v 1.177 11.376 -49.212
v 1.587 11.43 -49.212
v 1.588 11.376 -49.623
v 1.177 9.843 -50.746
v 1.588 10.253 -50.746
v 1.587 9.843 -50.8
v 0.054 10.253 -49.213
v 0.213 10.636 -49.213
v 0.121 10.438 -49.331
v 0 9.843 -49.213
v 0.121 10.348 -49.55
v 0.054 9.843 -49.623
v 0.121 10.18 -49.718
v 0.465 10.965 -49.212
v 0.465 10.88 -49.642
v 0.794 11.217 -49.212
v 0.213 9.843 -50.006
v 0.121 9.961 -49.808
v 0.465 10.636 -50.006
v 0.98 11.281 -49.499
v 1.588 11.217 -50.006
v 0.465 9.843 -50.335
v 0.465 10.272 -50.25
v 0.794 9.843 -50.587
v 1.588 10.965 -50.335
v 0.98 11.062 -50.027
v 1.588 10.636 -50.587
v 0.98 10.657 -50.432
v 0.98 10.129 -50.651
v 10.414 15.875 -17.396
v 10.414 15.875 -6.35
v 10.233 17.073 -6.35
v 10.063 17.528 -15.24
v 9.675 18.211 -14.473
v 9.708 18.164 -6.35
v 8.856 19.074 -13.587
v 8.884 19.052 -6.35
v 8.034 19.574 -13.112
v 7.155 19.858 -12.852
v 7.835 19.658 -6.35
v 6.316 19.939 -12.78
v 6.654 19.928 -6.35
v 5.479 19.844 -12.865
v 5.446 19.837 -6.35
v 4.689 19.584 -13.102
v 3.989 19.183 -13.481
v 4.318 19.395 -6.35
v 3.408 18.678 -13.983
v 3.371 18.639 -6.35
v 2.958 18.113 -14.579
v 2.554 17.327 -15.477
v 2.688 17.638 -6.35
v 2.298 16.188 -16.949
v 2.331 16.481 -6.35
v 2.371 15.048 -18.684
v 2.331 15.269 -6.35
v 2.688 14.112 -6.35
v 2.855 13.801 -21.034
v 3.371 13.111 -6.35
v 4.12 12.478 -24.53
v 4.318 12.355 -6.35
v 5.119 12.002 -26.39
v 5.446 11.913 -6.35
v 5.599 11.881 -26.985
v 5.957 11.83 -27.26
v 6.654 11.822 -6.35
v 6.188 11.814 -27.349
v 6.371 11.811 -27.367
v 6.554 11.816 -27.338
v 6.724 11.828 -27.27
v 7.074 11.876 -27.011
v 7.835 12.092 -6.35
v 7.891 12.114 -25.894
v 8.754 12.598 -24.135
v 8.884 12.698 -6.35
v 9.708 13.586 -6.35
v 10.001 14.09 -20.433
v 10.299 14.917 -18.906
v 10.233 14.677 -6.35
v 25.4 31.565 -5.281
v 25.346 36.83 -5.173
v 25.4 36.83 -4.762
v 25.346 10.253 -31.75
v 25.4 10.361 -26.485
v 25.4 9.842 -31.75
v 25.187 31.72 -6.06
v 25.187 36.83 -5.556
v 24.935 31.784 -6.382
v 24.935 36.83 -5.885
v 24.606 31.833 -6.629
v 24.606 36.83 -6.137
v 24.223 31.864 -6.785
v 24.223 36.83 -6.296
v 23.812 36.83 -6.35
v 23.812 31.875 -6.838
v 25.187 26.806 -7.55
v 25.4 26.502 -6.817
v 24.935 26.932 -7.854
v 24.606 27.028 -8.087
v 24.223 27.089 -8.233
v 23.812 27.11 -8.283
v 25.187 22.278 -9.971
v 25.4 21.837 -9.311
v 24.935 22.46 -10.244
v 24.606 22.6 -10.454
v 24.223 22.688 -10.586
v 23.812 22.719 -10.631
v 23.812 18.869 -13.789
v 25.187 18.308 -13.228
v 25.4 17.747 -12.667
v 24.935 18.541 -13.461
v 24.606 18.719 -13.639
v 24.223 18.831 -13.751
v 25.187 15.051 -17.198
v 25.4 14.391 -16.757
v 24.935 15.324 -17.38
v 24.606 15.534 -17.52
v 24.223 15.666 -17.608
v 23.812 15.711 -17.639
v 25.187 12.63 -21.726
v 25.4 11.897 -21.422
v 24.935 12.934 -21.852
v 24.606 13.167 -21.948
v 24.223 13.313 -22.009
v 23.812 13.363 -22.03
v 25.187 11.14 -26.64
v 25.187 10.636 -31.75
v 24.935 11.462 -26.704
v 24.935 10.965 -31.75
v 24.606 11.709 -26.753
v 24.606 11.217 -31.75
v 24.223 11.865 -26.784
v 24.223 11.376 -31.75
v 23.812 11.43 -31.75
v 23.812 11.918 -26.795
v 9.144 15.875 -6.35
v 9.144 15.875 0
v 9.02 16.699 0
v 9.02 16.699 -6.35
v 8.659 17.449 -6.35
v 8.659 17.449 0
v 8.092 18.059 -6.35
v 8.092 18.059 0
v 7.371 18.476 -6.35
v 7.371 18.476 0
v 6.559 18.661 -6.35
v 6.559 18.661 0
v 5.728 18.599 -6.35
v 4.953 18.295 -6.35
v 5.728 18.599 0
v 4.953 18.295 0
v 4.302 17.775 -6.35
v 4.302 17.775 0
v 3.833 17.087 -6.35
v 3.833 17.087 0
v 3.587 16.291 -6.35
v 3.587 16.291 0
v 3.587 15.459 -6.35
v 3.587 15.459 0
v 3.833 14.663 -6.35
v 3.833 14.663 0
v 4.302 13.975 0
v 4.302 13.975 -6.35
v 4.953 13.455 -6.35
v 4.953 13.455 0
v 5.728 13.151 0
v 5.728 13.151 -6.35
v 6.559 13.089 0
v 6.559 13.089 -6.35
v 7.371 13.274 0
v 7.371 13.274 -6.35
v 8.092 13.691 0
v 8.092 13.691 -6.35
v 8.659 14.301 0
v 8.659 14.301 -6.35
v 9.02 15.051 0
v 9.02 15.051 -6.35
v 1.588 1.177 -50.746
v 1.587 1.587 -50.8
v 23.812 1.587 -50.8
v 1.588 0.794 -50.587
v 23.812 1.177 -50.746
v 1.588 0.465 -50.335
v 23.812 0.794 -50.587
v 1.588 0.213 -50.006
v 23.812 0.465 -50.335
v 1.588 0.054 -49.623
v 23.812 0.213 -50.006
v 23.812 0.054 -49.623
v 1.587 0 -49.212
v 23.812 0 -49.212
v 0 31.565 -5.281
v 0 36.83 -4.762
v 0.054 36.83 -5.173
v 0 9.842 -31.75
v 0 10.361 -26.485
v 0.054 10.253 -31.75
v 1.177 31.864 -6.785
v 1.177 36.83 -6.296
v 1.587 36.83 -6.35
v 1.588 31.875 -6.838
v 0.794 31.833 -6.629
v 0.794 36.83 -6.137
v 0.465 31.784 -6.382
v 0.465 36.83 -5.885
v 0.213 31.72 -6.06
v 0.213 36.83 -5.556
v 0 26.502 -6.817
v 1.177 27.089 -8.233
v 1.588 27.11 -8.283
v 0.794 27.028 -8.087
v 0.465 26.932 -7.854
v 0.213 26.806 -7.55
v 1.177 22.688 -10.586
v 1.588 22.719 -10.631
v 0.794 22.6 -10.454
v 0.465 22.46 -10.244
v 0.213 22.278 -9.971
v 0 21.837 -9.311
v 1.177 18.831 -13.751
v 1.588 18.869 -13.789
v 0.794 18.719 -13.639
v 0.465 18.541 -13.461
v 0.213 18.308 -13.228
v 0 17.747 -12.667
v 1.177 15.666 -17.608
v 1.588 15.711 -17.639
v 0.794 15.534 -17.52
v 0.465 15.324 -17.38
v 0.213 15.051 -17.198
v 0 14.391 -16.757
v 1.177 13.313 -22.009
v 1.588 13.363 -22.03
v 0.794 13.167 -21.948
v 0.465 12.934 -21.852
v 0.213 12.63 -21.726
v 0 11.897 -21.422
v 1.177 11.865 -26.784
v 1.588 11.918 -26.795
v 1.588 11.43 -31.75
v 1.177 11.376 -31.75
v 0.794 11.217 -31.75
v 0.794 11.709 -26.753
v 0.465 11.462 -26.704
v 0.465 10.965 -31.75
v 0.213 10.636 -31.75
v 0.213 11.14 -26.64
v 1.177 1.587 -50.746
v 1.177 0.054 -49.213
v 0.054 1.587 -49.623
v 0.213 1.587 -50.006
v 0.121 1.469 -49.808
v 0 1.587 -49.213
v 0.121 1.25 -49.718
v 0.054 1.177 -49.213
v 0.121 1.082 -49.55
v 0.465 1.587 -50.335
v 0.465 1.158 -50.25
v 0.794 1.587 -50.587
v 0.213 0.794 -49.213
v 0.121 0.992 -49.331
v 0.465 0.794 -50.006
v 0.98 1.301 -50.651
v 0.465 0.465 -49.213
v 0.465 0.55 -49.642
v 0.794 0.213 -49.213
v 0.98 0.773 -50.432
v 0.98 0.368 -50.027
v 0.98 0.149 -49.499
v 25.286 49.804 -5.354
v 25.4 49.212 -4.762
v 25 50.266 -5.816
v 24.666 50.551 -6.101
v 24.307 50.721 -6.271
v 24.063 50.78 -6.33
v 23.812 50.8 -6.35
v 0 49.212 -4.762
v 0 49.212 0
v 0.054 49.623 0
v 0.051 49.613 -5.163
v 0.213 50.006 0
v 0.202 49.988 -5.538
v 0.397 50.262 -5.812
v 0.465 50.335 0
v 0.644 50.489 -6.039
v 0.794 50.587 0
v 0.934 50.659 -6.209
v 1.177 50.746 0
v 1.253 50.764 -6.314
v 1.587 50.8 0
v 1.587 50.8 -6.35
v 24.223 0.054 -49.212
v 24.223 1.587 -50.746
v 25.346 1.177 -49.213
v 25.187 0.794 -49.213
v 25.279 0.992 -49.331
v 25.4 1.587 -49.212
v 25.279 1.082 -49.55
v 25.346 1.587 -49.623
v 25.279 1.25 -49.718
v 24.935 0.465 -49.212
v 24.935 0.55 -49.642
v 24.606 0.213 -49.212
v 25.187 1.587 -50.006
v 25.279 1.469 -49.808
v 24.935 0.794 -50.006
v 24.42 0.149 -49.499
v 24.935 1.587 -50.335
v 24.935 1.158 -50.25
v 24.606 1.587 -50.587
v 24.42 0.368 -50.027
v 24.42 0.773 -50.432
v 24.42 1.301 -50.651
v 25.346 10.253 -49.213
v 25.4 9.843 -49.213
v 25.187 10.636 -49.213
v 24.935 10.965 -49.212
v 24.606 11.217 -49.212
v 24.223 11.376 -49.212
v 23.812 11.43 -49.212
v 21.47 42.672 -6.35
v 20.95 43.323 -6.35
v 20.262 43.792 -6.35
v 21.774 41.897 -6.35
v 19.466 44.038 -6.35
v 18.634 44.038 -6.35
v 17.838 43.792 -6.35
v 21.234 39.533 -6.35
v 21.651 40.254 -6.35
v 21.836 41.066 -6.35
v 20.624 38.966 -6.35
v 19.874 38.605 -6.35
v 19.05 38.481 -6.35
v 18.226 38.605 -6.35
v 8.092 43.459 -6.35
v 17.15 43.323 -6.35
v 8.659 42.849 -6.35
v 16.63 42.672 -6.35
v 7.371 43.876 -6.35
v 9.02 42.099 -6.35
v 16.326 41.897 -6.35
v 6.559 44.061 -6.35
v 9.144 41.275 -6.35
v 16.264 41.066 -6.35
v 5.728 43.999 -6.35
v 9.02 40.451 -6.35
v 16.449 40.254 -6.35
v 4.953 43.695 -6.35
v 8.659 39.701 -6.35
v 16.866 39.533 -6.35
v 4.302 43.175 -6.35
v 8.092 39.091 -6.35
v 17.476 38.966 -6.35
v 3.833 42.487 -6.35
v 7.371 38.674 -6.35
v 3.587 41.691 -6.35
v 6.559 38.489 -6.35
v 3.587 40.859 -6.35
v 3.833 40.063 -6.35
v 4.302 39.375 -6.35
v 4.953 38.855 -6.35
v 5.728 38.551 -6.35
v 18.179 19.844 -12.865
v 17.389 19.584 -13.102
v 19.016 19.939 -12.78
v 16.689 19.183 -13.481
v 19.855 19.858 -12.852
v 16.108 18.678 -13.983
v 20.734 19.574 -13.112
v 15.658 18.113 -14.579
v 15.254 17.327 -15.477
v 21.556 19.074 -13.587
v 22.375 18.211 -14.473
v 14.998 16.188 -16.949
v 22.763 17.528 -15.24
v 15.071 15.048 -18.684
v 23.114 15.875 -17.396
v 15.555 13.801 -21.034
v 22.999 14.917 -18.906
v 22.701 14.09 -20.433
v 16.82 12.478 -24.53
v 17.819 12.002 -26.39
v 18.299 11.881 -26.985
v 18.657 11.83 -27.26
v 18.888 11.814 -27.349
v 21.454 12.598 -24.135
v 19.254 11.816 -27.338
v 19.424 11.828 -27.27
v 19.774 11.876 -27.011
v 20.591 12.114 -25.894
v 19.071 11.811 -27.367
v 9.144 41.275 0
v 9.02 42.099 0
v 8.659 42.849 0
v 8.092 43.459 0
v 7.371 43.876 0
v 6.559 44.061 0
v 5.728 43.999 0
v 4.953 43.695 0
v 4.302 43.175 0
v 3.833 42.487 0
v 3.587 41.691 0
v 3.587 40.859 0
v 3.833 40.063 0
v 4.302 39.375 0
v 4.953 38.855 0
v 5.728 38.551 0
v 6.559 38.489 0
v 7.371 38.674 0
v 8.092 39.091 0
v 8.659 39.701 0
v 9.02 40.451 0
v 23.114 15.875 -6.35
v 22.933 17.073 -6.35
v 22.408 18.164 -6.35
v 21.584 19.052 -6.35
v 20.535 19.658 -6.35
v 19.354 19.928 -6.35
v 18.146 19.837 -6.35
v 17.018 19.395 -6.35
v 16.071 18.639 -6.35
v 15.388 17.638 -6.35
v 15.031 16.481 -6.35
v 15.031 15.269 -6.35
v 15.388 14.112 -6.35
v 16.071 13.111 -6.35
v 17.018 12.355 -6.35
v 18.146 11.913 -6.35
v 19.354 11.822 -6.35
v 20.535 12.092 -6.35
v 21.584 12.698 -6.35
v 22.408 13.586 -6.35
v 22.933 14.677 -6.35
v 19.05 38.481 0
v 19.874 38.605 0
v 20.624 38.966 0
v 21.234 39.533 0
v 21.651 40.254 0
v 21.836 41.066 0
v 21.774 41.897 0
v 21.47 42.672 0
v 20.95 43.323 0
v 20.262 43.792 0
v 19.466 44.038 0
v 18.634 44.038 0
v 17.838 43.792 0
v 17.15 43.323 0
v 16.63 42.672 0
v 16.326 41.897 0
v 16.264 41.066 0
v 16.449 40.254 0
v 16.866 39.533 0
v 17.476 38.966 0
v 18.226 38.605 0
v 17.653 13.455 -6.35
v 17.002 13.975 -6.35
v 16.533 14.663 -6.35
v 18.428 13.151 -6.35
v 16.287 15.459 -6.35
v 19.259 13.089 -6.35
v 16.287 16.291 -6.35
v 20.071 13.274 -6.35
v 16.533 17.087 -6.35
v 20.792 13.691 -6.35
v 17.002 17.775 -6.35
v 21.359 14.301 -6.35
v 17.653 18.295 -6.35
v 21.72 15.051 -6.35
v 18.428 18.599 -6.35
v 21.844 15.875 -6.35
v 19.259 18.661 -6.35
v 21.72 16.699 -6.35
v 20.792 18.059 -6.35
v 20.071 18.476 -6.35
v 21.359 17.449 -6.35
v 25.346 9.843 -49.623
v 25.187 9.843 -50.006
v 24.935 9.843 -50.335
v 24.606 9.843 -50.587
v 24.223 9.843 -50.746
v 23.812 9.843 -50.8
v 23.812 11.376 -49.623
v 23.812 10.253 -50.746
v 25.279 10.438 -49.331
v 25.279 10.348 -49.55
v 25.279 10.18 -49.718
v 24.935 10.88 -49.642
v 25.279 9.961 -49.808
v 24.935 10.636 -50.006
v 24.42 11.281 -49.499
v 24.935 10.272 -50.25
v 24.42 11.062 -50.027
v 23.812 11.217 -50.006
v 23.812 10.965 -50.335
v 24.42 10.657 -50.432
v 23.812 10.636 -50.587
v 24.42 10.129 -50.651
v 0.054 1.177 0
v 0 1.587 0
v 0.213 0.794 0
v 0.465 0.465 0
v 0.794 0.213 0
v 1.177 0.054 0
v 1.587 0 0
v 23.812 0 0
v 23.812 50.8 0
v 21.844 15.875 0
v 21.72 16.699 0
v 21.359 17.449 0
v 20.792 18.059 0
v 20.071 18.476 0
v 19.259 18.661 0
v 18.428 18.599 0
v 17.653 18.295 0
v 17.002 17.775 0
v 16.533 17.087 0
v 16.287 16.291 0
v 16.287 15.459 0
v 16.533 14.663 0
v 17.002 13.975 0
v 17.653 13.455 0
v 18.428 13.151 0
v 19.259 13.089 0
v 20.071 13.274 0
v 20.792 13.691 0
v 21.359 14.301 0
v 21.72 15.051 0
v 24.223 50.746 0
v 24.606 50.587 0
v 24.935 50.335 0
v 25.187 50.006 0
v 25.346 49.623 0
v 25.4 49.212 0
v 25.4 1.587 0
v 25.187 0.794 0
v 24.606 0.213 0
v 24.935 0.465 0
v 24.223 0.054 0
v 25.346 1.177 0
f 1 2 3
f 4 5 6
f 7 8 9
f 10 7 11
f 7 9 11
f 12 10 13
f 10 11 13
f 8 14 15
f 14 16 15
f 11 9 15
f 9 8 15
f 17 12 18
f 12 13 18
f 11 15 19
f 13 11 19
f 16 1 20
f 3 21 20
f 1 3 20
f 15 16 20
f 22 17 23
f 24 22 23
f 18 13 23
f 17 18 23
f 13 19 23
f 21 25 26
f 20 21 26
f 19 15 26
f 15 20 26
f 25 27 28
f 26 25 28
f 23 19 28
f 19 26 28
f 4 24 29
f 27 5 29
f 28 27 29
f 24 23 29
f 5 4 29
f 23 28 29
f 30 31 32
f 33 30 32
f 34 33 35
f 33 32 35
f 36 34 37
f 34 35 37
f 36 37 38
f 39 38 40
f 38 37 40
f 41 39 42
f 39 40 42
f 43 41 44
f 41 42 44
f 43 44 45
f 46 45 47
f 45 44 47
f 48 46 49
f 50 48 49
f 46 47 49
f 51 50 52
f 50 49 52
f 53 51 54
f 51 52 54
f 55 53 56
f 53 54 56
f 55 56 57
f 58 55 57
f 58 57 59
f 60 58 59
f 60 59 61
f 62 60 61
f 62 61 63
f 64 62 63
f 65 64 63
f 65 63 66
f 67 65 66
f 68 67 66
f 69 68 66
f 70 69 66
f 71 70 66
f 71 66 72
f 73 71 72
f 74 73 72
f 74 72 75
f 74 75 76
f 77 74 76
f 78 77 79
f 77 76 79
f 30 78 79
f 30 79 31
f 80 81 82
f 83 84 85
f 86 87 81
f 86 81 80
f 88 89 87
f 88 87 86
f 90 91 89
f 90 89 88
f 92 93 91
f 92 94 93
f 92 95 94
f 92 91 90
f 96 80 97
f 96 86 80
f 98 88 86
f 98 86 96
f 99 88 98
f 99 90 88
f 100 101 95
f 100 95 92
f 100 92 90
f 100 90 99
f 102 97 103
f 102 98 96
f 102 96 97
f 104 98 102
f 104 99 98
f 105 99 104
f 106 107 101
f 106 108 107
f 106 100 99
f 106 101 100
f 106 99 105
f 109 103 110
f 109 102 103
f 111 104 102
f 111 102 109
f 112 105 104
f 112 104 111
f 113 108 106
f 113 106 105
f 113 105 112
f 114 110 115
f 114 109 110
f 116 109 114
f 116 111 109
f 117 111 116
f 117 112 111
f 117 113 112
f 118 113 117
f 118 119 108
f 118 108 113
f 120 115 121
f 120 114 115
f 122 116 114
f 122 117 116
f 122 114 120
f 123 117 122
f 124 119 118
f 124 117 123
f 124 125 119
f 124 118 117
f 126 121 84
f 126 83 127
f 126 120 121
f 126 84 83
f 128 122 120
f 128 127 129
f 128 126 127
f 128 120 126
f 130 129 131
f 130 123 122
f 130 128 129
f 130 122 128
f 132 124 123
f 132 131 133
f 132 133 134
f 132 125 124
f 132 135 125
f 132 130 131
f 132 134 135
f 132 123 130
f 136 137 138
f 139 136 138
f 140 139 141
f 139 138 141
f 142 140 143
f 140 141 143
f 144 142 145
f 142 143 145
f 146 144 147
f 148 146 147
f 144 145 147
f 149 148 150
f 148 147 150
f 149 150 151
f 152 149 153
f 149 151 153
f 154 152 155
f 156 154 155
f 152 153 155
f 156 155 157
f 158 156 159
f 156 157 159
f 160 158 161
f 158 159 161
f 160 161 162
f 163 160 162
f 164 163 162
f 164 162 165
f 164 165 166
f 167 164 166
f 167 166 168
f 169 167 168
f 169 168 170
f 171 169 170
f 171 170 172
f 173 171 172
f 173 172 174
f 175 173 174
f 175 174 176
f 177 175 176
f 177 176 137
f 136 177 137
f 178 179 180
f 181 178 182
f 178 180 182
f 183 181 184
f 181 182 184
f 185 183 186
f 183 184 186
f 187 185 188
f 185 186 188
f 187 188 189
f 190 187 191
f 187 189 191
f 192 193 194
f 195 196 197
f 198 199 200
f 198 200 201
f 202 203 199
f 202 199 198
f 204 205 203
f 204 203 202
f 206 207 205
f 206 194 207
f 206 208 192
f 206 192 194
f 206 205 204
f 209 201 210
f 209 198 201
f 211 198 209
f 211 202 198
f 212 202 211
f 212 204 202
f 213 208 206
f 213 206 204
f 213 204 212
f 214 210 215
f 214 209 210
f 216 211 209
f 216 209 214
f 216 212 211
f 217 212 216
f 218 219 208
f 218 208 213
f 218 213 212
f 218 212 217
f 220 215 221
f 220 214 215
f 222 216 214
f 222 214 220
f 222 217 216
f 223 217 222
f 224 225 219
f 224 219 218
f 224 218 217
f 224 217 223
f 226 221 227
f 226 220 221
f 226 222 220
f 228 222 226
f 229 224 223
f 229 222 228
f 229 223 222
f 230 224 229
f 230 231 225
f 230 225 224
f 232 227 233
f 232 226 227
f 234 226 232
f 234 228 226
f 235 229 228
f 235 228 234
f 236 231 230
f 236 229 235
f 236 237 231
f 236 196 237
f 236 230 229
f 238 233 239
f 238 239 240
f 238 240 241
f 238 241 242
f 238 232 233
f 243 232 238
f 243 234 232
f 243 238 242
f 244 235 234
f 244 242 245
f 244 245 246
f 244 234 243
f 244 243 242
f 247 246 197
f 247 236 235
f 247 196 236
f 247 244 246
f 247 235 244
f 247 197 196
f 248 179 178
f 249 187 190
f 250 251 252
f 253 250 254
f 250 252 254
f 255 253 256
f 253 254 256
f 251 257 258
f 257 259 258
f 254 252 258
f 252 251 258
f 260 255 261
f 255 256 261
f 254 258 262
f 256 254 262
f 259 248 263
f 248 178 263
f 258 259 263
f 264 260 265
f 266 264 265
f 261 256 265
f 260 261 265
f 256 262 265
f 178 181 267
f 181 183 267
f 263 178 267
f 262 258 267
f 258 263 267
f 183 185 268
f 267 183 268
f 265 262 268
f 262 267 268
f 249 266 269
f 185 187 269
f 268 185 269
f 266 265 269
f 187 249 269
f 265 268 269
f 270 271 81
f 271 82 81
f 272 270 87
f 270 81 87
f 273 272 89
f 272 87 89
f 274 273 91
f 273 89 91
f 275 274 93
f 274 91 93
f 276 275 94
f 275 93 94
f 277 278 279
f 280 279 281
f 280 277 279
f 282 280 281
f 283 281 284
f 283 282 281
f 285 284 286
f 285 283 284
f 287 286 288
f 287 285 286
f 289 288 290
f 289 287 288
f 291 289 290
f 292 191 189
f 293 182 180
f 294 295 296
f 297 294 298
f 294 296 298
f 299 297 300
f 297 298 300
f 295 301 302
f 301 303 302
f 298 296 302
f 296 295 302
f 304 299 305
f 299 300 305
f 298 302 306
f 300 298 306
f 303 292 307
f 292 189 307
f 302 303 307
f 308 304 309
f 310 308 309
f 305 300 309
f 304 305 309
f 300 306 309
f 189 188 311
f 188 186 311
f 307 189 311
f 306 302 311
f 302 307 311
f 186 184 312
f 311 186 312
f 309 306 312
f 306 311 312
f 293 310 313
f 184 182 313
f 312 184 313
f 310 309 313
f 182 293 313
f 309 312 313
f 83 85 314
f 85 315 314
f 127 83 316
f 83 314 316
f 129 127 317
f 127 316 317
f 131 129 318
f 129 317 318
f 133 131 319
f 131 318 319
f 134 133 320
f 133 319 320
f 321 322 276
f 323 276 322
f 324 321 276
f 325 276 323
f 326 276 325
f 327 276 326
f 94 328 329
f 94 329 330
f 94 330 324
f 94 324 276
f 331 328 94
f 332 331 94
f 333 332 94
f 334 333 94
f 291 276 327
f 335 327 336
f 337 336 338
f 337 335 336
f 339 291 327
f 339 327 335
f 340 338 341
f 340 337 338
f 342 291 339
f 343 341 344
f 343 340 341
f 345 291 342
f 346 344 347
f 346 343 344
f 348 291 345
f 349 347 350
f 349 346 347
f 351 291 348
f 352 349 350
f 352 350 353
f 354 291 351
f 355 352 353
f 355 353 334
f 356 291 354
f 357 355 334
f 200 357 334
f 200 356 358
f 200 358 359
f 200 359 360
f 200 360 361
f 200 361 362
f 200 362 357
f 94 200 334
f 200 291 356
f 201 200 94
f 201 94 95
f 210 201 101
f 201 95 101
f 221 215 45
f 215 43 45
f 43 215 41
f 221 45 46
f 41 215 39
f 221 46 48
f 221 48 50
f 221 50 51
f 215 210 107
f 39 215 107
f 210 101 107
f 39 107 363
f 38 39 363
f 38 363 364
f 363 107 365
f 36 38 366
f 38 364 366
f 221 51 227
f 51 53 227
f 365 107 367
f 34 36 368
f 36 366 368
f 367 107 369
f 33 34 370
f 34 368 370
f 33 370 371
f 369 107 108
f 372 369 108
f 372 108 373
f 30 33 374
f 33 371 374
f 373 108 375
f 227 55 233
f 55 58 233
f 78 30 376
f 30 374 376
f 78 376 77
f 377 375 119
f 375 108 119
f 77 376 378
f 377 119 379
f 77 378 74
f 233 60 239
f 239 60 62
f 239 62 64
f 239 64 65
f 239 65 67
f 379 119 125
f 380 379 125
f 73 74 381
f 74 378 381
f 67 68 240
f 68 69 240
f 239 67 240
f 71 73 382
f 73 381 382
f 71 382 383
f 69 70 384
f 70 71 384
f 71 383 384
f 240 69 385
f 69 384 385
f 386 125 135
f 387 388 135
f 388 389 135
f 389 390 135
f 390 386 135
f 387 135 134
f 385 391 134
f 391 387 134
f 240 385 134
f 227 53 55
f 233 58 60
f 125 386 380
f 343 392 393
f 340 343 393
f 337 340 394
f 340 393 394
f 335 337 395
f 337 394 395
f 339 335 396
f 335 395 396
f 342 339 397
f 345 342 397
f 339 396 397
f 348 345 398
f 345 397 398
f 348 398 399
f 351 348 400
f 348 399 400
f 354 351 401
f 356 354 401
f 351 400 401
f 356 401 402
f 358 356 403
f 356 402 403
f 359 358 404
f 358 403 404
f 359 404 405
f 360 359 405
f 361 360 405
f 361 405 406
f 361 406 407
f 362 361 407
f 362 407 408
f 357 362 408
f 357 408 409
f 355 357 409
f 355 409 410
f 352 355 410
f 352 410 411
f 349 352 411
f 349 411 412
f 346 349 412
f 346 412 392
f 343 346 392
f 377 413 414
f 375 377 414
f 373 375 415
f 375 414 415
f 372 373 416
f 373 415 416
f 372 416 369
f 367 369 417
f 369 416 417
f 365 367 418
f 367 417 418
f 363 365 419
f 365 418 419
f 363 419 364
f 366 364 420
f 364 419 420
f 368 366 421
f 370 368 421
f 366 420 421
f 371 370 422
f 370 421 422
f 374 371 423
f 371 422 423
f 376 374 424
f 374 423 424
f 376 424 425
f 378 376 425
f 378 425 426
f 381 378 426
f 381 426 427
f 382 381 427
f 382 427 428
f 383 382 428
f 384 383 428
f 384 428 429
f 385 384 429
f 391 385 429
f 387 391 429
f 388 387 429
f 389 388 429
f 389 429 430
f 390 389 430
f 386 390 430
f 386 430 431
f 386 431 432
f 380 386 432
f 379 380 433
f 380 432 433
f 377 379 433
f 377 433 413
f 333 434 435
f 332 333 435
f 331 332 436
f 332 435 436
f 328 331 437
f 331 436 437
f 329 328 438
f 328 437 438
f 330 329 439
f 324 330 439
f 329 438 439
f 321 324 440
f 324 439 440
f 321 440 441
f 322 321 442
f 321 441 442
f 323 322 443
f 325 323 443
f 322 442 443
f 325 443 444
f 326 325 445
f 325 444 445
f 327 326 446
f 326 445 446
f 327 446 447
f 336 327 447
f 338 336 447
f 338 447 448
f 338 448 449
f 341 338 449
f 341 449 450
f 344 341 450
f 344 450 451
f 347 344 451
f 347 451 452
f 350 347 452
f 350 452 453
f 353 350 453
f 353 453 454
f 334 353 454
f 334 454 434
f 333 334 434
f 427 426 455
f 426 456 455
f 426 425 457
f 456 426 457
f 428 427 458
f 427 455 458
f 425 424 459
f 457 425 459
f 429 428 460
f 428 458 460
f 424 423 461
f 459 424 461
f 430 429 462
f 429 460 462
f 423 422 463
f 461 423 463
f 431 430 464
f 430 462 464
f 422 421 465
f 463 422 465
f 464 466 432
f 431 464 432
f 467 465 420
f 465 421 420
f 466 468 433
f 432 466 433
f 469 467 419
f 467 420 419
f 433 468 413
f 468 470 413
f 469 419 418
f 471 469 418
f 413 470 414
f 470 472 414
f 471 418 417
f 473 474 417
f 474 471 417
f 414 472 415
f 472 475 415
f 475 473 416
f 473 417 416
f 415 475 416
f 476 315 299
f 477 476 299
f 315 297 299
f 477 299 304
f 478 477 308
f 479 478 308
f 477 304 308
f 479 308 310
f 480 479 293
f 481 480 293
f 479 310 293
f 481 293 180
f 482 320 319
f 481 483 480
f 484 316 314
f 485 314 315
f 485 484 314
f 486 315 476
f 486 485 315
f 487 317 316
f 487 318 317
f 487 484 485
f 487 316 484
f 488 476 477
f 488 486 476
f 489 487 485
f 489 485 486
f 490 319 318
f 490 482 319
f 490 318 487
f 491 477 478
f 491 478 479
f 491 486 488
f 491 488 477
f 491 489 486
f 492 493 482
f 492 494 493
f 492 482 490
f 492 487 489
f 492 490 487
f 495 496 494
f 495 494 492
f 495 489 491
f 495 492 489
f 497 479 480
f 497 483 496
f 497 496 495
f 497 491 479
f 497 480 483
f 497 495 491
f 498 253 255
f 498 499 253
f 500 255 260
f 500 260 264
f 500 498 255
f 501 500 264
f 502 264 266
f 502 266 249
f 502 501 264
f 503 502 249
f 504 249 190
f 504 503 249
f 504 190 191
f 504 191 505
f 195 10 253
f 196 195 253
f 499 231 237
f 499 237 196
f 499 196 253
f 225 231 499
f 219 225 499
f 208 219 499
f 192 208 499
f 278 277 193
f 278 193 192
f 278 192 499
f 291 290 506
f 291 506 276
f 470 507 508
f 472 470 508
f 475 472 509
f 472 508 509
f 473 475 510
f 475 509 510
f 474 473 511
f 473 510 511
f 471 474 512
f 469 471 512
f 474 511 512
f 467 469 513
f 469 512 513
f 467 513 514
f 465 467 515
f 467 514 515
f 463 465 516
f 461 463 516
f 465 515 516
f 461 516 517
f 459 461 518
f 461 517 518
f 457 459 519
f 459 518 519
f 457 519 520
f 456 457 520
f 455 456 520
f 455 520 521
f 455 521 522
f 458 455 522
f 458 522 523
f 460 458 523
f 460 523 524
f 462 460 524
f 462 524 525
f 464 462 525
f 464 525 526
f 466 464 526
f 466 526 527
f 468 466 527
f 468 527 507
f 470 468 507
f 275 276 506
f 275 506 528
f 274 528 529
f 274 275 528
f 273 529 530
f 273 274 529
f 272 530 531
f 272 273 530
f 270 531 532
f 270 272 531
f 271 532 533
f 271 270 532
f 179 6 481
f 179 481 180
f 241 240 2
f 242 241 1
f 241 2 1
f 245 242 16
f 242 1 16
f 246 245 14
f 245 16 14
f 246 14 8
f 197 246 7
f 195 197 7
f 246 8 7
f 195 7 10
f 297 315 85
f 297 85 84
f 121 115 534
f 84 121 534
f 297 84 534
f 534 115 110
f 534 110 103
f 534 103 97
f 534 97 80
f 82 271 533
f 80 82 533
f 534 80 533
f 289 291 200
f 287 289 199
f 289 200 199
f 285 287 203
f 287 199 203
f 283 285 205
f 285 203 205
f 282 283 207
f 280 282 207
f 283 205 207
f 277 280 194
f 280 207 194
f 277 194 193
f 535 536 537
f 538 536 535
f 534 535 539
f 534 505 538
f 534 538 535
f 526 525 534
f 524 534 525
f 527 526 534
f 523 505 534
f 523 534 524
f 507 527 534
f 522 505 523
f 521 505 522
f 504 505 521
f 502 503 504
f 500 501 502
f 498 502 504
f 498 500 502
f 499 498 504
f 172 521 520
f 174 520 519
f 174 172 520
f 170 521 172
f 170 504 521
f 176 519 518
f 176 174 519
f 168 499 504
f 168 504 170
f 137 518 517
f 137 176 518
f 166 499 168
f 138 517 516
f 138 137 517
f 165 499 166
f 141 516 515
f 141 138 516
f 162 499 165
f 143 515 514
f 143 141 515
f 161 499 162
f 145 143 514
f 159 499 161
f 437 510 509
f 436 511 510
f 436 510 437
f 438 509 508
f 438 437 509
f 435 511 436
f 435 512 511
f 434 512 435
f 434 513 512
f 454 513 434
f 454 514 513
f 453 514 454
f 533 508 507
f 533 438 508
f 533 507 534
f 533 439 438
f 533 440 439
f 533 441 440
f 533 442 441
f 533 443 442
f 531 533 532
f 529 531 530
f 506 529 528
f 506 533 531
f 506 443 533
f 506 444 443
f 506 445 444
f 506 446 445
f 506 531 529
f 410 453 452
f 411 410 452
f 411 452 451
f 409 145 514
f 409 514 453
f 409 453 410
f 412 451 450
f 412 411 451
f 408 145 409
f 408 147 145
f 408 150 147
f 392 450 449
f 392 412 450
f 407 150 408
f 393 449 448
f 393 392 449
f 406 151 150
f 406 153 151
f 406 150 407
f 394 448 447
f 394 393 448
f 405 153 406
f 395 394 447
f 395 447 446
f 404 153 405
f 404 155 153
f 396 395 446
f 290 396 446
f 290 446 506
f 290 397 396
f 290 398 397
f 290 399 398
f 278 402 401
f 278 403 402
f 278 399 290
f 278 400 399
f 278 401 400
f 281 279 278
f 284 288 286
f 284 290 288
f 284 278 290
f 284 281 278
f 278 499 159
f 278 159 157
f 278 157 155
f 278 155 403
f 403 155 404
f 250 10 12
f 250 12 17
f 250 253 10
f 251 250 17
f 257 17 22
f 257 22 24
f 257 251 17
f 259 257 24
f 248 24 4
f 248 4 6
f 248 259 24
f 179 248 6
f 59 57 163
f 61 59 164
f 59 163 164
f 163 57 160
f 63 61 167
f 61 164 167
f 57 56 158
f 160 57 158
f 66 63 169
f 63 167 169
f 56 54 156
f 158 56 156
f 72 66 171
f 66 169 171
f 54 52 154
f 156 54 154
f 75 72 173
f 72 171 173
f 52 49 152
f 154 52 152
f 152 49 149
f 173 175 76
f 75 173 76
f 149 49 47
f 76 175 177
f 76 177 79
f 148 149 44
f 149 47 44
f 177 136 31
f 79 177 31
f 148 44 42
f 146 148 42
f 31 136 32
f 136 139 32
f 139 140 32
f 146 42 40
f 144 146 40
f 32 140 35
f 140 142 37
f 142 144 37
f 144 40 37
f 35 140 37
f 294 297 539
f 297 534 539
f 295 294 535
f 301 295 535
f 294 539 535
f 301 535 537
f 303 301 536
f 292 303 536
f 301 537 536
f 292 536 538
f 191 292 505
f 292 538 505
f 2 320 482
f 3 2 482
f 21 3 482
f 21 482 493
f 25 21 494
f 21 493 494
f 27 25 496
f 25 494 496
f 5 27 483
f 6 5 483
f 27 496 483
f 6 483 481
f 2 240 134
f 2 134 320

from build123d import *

# Parameters (mm, degrees)
BOSS_EXTRUDE1_DEPTH = 25.4
FILLET1_R           = 25.4
SKETCH2_R           = 2.794
CUT_EXTRUDE1_DEPTH  = 77.2
CUT_EXTRUDE2_START  = -6.35
SKETCH3_R           = 4.064
CUT_EXTRUDE2_DEPTH  = 70.850000033
FILLET2_R           = 1.5875


with BuildPart() as part:
    # Sketch1 → Boss-Extrude1 (new body)
    with BuildSketch(Plane(origin=(0, 0, 0), x_dir=(0, 0, -1), z_dir=(1, 0, 0))):
        Polygon((0, 0), (0, 50.8), (6.35, 50.8), (6.35, 11.43), (50.8, 11.43), (50.8, 0), align=None)
    extrude(amount=BOSS_EXTRUDE1_DEPTH)

    # Fillet1
    fillet1_edges = [part.edges().sort_by_distance(p)[0] for p in [
        (12.7, 11.43, -6.35),
    ]]
    fillet(fillet1_edges, radius=FILLET1_R)

    # Sketch2 → Cut-Extrude1 (cut, through all)
    with BuildSketch(Plane.XY):
        with Locations((6.35, 41.275)):
            Circle(SKETCH2_R)
        with Locations((6.35, 15.875)):
            Circle(SKETCH2_R)
        with Locations(Location((19.05, 41.275, 0), (0, 0, 270))):
            Circle(SKETCH2_R)
        with Locations((19.05, 15.875)):
            Circle(SKETCH2_R)
    extrude(amount=-CUT_EXTRUDE1_DEPTH, mode=Mode.SUBTRACT)

    # Sketch3 → Cut-Extrude2 (cut, through all)
    with BuildSketch(Plane.XY.offset(CUT_EXTRUDE2_START)):
        with Locations((6.35, 15.875)):
            Circle(SKETCH3_R)
        with Locations((19.05, 15.875)):
            Circle(SKETCH3_R)
    extrude(amount=-CUT_EXTRUDE2_DEPTH, mode=Mode.SUBTRACT)

    # Fillet2
    fillet2_edges = [part.edges().sort_by_distance(p)[0] for p in [
        (12.7, 11.43, -50.8),
        (12.7, 0, -50.8),
        (25.4, 11.43, -41.275),
        (0, 43.815, -6.35),
        (25.4, 43.815, -6.35),
        (25.4, 50.8, -3.175),
        (0, 18.869487758, -13.789487758),
        (25.4, 18.869487758, -13.789487758),
        (25.4, 0, -25.4),
        (0, 50.8, -3.175),
        (0, 11.43, -41.275),
        (0, 5.715, -50.8),
        (0, 0, -25.4),
        (25.4, 5.715, -50.8),
    ]]
    fillet(fillet2_edges, radius=FILLET2_R)


solid = part.part
